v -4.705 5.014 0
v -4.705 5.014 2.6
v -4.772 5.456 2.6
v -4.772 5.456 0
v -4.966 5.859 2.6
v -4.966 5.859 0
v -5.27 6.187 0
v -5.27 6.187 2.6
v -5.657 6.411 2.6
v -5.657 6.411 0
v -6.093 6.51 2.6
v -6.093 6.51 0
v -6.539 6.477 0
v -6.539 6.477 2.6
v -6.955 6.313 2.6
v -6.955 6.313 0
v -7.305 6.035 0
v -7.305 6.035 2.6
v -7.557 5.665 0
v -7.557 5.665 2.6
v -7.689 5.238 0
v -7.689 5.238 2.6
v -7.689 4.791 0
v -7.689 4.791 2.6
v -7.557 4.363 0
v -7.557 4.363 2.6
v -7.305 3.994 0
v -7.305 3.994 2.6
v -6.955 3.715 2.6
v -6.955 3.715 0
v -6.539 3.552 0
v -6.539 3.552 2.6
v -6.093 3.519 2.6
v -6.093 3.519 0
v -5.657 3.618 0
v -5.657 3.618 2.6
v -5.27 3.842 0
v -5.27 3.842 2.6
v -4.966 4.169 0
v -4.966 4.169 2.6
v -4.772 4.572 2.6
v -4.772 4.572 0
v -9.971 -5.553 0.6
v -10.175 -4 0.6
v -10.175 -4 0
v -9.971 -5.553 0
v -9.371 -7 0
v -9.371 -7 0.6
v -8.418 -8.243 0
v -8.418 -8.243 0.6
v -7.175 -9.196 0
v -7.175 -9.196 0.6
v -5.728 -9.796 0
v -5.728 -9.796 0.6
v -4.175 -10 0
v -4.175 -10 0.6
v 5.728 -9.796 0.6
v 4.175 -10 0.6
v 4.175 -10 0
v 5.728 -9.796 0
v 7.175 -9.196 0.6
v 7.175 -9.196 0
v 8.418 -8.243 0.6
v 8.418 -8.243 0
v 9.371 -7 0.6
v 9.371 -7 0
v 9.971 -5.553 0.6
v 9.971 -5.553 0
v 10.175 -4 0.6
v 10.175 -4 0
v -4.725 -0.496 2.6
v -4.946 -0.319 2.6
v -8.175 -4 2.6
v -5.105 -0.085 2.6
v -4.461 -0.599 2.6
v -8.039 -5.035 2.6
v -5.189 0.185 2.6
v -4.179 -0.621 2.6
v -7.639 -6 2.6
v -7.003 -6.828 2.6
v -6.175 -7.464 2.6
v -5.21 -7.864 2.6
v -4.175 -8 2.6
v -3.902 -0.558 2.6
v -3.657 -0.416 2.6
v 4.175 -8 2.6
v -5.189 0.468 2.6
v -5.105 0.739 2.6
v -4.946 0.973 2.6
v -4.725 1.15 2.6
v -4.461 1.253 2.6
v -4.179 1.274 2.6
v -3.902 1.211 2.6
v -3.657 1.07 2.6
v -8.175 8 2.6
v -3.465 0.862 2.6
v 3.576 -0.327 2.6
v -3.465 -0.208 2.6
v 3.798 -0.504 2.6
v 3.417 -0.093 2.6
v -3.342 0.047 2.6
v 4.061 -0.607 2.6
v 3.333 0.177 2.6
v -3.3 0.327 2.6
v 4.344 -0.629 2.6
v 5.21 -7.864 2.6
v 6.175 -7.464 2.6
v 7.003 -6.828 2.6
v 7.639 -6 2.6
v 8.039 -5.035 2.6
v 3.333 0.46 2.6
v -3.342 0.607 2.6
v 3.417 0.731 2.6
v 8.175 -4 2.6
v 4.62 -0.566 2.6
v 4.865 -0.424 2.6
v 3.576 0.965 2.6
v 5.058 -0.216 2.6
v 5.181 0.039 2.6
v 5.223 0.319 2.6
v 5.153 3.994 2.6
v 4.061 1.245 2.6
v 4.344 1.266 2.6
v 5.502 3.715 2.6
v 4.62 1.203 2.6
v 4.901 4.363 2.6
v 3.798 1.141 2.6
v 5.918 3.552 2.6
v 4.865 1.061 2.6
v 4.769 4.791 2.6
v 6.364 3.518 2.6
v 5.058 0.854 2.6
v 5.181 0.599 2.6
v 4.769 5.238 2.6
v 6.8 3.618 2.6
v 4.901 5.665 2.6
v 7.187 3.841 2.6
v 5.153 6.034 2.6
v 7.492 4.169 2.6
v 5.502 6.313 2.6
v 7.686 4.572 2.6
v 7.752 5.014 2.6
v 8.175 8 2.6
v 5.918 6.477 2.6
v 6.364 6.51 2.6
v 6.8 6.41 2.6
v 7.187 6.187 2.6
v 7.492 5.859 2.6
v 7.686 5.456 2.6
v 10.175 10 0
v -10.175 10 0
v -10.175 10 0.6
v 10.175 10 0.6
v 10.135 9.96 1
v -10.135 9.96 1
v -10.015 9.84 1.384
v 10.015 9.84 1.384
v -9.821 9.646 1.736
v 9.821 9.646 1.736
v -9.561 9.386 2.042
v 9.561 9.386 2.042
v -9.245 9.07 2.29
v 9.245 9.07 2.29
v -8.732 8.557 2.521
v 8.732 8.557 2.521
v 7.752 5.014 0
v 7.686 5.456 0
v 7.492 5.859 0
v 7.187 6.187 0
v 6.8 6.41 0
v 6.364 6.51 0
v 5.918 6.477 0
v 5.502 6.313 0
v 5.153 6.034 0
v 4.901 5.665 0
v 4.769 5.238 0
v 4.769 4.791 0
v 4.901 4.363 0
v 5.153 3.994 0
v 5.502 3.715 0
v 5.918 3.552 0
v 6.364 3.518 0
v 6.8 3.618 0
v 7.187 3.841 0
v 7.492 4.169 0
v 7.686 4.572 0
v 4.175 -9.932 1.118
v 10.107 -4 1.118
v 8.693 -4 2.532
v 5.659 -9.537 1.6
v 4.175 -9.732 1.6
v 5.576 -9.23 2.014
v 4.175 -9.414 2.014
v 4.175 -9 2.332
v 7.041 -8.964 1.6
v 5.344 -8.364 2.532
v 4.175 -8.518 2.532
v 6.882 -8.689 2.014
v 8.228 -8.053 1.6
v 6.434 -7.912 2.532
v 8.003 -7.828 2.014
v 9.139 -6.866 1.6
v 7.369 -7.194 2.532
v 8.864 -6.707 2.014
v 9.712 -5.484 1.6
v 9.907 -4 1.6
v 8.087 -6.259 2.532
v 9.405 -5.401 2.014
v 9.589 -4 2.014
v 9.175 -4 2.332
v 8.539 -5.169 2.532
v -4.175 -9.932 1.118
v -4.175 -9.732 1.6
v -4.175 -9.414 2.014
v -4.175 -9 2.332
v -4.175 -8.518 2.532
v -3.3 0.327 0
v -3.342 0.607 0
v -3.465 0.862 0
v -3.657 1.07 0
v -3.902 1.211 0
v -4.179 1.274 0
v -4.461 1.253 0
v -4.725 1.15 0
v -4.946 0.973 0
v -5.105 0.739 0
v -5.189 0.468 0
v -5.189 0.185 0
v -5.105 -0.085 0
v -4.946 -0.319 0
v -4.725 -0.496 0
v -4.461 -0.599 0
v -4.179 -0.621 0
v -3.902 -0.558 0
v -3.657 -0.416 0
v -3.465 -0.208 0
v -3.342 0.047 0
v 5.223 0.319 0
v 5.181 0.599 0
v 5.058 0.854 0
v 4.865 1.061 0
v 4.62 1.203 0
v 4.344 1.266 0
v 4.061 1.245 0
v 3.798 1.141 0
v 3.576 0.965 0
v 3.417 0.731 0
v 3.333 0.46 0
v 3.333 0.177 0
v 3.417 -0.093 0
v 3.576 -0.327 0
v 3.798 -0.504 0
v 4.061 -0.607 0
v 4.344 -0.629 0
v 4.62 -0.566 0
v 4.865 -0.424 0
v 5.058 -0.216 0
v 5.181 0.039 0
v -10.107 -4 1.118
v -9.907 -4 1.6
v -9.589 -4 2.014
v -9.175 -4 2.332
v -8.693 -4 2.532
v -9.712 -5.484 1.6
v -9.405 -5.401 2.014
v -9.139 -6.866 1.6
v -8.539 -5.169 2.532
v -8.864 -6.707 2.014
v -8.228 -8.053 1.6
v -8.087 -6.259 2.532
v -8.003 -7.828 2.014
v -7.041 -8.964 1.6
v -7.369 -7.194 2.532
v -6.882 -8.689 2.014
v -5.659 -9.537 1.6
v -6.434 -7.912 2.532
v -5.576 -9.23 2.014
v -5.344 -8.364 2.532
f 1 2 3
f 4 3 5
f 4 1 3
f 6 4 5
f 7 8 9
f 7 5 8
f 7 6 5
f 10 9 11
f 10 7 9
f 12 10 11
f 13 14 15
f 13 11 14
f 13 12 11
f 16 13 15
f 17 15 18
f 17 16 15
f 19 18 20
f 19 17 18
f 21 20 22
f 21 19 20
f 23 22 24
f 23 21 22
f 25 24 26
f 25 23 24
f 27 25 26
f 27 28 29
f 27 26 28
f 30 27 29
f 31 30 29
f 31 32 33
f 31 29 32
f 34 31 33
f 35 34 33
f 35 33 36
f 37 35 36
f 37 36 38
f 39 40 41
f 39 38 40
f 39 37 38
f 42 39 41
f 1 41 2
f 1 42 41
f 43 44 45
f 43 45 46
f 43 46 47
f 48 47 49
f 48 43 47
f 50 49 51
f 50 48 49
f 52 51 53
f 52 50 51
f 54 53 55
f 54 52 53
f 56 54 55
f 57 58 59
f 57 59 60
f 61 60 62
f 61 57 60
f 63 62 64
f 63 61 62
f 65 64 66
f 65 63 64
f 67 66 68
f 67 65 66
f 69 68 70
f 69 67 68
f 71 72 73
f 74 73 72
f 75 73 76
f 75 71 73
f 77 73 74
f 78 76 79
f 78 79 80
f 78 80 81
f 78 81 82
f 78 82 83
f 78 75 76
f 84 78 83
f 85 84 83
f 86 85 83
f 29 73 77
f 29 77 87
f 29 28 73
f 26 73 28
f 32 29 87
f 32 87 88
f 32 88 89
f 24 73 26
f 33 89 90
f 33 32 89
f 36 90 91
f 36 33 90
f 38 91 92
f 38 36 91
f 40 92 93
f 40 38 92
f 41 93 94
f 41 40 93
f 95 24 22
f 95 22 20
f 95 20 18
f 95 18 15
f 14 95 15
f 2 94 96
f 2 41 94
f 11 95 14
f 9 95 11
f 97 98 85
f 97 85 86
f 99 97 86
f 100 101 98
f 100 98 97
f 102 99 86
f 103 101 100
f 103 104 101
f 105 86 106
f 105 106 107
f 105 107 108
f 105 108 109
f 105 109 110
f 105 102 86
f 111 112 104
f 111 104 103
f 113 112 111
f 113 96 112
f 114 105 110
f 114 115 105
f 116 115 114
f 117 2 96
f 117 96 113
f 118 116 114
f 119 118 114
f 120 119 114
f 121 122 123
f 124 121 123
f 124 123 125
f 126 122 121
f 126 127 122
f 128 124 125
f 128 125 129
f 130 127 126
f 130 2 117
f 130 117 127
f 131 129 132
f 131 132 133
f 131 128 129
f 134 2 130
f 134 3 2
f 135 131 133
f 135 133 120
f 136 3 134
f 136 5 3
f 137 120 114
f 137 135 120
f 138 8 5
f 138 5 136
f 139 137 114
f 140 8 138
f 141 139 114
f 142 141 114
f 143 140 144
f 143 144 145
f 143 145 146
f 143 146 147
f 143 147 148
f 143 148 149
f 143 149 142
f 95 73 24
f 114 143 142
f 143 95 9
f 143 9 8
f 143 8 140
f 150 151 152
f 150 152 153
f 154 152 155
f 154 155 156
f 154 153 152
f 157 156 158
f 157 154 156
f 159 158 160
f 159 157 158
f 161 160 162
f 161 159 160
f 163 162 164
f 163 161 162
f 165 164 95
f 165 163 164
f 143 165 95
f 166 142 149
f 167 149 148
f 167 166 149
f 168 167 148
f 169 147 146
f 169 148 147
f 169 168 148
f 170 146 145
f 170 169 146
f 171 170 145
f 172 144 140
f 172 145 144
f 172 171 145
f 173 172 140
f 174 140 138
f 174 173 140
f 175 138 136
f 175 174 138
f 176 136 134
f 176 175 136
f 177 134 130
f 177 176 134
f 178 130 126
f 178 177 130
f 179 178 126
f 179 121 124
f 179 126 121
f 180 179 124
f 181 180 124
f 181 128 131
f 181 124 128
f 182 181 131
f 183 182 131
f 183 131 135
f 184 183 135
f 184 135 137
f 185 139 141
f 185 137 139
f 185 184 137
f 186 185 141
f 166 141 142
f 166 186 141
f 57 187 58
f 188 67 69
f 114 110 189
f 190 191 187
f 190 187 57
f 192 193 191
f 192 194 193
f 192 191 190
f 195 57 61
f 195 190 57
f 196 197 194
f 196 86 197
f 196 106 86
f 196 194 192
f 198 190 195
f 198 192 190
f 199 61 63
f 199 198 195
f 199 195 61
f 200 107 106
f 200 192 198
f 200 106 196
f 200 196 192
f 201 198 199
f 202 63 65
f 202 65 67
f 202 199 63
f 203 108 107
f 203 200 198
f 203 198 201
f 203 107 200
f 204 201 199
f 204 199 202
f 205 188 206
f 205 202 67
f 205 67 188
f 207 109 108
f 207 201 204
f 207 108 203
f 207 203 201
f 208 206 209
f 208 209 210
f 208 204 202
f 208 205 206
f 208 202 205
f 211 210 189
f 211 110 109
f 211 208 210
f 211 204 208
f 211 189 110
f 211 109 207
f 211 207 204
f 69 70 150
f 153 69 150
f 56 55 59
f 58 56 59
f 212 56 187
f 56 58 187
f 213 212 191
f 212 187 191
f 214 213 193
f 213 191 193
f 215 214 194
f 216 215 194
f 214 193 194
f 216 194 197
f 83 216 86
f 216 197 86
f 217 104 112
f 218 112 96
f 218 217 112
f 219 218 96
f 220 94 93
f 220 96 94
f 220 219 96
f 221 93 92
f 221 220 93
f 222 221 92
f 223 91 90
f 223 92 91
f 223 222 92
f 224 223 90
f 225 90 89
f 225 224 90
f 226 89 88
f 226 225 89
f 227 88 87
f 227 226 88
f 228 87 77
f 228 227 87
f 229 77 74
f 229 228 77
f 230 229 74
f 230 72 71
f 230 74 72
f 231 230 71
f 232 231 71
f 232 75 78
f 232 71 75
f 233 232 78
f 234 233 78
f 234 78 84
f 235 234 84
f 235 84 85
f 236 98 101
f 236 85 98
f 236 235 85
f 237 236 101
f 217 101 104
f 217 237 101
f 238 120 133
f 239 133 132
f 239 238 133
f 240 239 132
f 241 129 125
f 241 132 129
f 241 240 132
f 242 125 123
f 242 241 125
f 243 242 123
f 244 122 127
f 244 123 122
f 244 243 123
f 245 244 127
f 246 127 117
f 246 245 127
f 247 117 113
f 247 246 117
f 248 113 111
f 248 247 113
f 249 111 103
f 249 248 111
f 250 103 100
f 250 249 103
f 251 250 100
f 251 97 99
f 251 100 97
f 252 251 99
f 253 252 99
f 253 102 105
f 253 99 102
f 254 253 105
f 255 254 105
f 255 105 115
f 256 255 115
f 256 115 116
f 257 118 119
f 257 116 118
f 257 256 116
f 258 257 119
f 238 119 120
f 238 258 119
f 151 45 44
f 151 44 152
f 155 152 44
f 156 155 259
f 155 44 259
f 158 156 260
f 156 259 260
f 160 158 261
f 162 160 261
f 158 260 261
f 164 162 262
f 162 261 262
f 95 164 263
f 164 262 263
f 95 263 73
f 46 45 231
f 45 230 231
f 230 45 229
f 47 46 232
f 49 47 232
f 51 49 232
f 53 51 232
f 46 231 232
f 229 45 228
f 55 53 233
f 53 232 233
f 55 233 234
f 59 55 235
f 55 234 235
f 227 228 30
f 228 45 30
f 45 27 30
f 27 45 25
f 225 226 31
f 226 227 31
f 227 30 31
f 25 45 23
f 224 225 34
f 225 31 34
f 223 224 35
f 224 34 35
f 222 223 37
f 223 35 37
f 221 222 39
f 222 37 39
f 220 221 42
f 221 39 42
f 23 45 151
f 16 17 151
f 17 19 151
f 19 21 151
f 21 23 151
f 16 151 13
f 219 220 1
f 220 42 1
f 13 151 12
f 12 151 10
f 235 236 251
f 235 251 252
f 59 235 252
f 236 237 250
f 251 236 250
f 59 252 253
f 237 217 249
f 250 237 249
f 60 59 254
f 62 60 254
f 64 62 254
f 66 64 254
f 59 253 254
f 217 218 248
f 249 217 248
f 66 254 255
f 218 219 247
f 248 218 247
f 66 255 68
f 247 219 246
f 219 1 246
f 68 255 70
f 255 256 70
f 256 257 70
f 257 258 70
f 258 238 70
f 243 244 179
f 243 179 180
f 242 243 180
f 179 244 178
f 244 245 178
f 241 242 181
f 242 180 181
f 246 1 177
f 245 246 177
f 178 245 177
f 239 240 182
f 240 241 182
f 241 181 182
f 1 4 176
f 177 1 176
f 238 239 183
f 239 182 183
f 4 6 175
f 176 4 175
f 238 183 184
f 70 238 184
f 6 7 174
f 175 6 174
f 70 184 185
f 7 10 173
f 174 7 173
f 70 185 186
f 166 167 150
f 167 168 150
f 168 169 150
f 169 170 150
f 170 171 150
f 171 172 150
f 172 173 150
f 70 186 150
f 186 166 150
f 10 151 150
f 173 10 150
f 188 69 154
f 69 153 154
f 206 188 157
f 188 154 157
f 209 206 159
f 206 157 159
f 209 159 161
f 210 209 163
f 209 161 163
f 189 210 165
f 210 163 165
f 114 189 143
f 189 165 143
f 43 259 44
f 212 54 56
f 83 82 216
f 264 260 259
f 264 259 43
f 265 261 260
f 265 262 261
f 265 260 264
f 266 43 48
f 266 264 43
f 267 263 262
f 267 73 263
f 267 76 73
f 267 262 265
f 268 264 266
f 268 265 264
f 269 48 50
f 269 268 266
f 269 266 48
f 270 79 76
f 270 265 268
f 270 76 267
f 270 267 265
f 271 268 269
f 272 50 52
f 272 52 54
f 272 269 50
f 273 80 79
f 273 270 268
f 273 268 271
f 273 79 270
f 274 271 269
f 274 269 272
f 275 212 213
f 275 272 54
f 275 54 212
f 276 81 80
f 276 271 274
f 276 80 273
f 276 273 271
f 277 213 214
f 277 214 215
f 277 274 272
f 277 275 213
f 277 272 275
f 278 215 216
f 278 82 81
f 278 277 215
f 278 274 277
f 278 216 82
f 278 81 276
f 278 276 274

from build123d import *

# Parameters (mm, degrees)
F0_W     = 20.35
F0_H     = 20
F1_DEPTH = 2.6
F2_R     = 1.5
F3_DEPTH = 25
F4_R     = 0.95
F5_DEPTH = 25
F6_R     = 6
F7_R     = 2


with BuildPart() as f1:
    # F0 (on Top) → F1 (new body)
    with BuildSketch(Plane.XY):
        Rectangle(F0_W, F0_H)
    extrude(amount=F1_DEPTH)

    # F2 (on Top) → F3 (cut)
    with BuildSketch(Plane.XY):
        with Locations((-6.2053604051, 5.0143129192)):
            Circle(F2_R)
        with Locations((6.2522287481, 5.0141313113)):
            Circle(F2_R)
    extrude(amount=F3_DEPTH, mode=Mode.SUBTRACT)

    # F4 (on Top) → F5 (cut)
    with BuildSketch(Plane.XY):
        with Locations((-4.2495448142, 0.3267968714)):
            Circle(F4_R)
        with Locations((4.2728632689, 0.318708655)):
            Circle(F4_R)
    extrude(amount=F5_DEPTH, mode=Mode.SUBTRACT)

    # F6
    f6_edges = [f1.edges().sort_by_distance(p)[0] for p in [
        (10.175, -10, 1.3),
        (-10.175, -10, 1.3),
    ]]
    fillet(f6_edges, radius=F6_R)

    # F7
    f7_edges = [f1.edges().sort_by_distance(p)[0] for p in [
        (-8.417641, -8.242641, 2.6),
        (8.417641, -8.242641, 2.6),
        (10.175, 3, 2.6),
        (0, 10, 2.6),
        (-10.175, 3, 2.6),
        (0, -10, 2.6),
    ]]
    fillet(f7_edges, radius=F7_R)


solid = f1.part
